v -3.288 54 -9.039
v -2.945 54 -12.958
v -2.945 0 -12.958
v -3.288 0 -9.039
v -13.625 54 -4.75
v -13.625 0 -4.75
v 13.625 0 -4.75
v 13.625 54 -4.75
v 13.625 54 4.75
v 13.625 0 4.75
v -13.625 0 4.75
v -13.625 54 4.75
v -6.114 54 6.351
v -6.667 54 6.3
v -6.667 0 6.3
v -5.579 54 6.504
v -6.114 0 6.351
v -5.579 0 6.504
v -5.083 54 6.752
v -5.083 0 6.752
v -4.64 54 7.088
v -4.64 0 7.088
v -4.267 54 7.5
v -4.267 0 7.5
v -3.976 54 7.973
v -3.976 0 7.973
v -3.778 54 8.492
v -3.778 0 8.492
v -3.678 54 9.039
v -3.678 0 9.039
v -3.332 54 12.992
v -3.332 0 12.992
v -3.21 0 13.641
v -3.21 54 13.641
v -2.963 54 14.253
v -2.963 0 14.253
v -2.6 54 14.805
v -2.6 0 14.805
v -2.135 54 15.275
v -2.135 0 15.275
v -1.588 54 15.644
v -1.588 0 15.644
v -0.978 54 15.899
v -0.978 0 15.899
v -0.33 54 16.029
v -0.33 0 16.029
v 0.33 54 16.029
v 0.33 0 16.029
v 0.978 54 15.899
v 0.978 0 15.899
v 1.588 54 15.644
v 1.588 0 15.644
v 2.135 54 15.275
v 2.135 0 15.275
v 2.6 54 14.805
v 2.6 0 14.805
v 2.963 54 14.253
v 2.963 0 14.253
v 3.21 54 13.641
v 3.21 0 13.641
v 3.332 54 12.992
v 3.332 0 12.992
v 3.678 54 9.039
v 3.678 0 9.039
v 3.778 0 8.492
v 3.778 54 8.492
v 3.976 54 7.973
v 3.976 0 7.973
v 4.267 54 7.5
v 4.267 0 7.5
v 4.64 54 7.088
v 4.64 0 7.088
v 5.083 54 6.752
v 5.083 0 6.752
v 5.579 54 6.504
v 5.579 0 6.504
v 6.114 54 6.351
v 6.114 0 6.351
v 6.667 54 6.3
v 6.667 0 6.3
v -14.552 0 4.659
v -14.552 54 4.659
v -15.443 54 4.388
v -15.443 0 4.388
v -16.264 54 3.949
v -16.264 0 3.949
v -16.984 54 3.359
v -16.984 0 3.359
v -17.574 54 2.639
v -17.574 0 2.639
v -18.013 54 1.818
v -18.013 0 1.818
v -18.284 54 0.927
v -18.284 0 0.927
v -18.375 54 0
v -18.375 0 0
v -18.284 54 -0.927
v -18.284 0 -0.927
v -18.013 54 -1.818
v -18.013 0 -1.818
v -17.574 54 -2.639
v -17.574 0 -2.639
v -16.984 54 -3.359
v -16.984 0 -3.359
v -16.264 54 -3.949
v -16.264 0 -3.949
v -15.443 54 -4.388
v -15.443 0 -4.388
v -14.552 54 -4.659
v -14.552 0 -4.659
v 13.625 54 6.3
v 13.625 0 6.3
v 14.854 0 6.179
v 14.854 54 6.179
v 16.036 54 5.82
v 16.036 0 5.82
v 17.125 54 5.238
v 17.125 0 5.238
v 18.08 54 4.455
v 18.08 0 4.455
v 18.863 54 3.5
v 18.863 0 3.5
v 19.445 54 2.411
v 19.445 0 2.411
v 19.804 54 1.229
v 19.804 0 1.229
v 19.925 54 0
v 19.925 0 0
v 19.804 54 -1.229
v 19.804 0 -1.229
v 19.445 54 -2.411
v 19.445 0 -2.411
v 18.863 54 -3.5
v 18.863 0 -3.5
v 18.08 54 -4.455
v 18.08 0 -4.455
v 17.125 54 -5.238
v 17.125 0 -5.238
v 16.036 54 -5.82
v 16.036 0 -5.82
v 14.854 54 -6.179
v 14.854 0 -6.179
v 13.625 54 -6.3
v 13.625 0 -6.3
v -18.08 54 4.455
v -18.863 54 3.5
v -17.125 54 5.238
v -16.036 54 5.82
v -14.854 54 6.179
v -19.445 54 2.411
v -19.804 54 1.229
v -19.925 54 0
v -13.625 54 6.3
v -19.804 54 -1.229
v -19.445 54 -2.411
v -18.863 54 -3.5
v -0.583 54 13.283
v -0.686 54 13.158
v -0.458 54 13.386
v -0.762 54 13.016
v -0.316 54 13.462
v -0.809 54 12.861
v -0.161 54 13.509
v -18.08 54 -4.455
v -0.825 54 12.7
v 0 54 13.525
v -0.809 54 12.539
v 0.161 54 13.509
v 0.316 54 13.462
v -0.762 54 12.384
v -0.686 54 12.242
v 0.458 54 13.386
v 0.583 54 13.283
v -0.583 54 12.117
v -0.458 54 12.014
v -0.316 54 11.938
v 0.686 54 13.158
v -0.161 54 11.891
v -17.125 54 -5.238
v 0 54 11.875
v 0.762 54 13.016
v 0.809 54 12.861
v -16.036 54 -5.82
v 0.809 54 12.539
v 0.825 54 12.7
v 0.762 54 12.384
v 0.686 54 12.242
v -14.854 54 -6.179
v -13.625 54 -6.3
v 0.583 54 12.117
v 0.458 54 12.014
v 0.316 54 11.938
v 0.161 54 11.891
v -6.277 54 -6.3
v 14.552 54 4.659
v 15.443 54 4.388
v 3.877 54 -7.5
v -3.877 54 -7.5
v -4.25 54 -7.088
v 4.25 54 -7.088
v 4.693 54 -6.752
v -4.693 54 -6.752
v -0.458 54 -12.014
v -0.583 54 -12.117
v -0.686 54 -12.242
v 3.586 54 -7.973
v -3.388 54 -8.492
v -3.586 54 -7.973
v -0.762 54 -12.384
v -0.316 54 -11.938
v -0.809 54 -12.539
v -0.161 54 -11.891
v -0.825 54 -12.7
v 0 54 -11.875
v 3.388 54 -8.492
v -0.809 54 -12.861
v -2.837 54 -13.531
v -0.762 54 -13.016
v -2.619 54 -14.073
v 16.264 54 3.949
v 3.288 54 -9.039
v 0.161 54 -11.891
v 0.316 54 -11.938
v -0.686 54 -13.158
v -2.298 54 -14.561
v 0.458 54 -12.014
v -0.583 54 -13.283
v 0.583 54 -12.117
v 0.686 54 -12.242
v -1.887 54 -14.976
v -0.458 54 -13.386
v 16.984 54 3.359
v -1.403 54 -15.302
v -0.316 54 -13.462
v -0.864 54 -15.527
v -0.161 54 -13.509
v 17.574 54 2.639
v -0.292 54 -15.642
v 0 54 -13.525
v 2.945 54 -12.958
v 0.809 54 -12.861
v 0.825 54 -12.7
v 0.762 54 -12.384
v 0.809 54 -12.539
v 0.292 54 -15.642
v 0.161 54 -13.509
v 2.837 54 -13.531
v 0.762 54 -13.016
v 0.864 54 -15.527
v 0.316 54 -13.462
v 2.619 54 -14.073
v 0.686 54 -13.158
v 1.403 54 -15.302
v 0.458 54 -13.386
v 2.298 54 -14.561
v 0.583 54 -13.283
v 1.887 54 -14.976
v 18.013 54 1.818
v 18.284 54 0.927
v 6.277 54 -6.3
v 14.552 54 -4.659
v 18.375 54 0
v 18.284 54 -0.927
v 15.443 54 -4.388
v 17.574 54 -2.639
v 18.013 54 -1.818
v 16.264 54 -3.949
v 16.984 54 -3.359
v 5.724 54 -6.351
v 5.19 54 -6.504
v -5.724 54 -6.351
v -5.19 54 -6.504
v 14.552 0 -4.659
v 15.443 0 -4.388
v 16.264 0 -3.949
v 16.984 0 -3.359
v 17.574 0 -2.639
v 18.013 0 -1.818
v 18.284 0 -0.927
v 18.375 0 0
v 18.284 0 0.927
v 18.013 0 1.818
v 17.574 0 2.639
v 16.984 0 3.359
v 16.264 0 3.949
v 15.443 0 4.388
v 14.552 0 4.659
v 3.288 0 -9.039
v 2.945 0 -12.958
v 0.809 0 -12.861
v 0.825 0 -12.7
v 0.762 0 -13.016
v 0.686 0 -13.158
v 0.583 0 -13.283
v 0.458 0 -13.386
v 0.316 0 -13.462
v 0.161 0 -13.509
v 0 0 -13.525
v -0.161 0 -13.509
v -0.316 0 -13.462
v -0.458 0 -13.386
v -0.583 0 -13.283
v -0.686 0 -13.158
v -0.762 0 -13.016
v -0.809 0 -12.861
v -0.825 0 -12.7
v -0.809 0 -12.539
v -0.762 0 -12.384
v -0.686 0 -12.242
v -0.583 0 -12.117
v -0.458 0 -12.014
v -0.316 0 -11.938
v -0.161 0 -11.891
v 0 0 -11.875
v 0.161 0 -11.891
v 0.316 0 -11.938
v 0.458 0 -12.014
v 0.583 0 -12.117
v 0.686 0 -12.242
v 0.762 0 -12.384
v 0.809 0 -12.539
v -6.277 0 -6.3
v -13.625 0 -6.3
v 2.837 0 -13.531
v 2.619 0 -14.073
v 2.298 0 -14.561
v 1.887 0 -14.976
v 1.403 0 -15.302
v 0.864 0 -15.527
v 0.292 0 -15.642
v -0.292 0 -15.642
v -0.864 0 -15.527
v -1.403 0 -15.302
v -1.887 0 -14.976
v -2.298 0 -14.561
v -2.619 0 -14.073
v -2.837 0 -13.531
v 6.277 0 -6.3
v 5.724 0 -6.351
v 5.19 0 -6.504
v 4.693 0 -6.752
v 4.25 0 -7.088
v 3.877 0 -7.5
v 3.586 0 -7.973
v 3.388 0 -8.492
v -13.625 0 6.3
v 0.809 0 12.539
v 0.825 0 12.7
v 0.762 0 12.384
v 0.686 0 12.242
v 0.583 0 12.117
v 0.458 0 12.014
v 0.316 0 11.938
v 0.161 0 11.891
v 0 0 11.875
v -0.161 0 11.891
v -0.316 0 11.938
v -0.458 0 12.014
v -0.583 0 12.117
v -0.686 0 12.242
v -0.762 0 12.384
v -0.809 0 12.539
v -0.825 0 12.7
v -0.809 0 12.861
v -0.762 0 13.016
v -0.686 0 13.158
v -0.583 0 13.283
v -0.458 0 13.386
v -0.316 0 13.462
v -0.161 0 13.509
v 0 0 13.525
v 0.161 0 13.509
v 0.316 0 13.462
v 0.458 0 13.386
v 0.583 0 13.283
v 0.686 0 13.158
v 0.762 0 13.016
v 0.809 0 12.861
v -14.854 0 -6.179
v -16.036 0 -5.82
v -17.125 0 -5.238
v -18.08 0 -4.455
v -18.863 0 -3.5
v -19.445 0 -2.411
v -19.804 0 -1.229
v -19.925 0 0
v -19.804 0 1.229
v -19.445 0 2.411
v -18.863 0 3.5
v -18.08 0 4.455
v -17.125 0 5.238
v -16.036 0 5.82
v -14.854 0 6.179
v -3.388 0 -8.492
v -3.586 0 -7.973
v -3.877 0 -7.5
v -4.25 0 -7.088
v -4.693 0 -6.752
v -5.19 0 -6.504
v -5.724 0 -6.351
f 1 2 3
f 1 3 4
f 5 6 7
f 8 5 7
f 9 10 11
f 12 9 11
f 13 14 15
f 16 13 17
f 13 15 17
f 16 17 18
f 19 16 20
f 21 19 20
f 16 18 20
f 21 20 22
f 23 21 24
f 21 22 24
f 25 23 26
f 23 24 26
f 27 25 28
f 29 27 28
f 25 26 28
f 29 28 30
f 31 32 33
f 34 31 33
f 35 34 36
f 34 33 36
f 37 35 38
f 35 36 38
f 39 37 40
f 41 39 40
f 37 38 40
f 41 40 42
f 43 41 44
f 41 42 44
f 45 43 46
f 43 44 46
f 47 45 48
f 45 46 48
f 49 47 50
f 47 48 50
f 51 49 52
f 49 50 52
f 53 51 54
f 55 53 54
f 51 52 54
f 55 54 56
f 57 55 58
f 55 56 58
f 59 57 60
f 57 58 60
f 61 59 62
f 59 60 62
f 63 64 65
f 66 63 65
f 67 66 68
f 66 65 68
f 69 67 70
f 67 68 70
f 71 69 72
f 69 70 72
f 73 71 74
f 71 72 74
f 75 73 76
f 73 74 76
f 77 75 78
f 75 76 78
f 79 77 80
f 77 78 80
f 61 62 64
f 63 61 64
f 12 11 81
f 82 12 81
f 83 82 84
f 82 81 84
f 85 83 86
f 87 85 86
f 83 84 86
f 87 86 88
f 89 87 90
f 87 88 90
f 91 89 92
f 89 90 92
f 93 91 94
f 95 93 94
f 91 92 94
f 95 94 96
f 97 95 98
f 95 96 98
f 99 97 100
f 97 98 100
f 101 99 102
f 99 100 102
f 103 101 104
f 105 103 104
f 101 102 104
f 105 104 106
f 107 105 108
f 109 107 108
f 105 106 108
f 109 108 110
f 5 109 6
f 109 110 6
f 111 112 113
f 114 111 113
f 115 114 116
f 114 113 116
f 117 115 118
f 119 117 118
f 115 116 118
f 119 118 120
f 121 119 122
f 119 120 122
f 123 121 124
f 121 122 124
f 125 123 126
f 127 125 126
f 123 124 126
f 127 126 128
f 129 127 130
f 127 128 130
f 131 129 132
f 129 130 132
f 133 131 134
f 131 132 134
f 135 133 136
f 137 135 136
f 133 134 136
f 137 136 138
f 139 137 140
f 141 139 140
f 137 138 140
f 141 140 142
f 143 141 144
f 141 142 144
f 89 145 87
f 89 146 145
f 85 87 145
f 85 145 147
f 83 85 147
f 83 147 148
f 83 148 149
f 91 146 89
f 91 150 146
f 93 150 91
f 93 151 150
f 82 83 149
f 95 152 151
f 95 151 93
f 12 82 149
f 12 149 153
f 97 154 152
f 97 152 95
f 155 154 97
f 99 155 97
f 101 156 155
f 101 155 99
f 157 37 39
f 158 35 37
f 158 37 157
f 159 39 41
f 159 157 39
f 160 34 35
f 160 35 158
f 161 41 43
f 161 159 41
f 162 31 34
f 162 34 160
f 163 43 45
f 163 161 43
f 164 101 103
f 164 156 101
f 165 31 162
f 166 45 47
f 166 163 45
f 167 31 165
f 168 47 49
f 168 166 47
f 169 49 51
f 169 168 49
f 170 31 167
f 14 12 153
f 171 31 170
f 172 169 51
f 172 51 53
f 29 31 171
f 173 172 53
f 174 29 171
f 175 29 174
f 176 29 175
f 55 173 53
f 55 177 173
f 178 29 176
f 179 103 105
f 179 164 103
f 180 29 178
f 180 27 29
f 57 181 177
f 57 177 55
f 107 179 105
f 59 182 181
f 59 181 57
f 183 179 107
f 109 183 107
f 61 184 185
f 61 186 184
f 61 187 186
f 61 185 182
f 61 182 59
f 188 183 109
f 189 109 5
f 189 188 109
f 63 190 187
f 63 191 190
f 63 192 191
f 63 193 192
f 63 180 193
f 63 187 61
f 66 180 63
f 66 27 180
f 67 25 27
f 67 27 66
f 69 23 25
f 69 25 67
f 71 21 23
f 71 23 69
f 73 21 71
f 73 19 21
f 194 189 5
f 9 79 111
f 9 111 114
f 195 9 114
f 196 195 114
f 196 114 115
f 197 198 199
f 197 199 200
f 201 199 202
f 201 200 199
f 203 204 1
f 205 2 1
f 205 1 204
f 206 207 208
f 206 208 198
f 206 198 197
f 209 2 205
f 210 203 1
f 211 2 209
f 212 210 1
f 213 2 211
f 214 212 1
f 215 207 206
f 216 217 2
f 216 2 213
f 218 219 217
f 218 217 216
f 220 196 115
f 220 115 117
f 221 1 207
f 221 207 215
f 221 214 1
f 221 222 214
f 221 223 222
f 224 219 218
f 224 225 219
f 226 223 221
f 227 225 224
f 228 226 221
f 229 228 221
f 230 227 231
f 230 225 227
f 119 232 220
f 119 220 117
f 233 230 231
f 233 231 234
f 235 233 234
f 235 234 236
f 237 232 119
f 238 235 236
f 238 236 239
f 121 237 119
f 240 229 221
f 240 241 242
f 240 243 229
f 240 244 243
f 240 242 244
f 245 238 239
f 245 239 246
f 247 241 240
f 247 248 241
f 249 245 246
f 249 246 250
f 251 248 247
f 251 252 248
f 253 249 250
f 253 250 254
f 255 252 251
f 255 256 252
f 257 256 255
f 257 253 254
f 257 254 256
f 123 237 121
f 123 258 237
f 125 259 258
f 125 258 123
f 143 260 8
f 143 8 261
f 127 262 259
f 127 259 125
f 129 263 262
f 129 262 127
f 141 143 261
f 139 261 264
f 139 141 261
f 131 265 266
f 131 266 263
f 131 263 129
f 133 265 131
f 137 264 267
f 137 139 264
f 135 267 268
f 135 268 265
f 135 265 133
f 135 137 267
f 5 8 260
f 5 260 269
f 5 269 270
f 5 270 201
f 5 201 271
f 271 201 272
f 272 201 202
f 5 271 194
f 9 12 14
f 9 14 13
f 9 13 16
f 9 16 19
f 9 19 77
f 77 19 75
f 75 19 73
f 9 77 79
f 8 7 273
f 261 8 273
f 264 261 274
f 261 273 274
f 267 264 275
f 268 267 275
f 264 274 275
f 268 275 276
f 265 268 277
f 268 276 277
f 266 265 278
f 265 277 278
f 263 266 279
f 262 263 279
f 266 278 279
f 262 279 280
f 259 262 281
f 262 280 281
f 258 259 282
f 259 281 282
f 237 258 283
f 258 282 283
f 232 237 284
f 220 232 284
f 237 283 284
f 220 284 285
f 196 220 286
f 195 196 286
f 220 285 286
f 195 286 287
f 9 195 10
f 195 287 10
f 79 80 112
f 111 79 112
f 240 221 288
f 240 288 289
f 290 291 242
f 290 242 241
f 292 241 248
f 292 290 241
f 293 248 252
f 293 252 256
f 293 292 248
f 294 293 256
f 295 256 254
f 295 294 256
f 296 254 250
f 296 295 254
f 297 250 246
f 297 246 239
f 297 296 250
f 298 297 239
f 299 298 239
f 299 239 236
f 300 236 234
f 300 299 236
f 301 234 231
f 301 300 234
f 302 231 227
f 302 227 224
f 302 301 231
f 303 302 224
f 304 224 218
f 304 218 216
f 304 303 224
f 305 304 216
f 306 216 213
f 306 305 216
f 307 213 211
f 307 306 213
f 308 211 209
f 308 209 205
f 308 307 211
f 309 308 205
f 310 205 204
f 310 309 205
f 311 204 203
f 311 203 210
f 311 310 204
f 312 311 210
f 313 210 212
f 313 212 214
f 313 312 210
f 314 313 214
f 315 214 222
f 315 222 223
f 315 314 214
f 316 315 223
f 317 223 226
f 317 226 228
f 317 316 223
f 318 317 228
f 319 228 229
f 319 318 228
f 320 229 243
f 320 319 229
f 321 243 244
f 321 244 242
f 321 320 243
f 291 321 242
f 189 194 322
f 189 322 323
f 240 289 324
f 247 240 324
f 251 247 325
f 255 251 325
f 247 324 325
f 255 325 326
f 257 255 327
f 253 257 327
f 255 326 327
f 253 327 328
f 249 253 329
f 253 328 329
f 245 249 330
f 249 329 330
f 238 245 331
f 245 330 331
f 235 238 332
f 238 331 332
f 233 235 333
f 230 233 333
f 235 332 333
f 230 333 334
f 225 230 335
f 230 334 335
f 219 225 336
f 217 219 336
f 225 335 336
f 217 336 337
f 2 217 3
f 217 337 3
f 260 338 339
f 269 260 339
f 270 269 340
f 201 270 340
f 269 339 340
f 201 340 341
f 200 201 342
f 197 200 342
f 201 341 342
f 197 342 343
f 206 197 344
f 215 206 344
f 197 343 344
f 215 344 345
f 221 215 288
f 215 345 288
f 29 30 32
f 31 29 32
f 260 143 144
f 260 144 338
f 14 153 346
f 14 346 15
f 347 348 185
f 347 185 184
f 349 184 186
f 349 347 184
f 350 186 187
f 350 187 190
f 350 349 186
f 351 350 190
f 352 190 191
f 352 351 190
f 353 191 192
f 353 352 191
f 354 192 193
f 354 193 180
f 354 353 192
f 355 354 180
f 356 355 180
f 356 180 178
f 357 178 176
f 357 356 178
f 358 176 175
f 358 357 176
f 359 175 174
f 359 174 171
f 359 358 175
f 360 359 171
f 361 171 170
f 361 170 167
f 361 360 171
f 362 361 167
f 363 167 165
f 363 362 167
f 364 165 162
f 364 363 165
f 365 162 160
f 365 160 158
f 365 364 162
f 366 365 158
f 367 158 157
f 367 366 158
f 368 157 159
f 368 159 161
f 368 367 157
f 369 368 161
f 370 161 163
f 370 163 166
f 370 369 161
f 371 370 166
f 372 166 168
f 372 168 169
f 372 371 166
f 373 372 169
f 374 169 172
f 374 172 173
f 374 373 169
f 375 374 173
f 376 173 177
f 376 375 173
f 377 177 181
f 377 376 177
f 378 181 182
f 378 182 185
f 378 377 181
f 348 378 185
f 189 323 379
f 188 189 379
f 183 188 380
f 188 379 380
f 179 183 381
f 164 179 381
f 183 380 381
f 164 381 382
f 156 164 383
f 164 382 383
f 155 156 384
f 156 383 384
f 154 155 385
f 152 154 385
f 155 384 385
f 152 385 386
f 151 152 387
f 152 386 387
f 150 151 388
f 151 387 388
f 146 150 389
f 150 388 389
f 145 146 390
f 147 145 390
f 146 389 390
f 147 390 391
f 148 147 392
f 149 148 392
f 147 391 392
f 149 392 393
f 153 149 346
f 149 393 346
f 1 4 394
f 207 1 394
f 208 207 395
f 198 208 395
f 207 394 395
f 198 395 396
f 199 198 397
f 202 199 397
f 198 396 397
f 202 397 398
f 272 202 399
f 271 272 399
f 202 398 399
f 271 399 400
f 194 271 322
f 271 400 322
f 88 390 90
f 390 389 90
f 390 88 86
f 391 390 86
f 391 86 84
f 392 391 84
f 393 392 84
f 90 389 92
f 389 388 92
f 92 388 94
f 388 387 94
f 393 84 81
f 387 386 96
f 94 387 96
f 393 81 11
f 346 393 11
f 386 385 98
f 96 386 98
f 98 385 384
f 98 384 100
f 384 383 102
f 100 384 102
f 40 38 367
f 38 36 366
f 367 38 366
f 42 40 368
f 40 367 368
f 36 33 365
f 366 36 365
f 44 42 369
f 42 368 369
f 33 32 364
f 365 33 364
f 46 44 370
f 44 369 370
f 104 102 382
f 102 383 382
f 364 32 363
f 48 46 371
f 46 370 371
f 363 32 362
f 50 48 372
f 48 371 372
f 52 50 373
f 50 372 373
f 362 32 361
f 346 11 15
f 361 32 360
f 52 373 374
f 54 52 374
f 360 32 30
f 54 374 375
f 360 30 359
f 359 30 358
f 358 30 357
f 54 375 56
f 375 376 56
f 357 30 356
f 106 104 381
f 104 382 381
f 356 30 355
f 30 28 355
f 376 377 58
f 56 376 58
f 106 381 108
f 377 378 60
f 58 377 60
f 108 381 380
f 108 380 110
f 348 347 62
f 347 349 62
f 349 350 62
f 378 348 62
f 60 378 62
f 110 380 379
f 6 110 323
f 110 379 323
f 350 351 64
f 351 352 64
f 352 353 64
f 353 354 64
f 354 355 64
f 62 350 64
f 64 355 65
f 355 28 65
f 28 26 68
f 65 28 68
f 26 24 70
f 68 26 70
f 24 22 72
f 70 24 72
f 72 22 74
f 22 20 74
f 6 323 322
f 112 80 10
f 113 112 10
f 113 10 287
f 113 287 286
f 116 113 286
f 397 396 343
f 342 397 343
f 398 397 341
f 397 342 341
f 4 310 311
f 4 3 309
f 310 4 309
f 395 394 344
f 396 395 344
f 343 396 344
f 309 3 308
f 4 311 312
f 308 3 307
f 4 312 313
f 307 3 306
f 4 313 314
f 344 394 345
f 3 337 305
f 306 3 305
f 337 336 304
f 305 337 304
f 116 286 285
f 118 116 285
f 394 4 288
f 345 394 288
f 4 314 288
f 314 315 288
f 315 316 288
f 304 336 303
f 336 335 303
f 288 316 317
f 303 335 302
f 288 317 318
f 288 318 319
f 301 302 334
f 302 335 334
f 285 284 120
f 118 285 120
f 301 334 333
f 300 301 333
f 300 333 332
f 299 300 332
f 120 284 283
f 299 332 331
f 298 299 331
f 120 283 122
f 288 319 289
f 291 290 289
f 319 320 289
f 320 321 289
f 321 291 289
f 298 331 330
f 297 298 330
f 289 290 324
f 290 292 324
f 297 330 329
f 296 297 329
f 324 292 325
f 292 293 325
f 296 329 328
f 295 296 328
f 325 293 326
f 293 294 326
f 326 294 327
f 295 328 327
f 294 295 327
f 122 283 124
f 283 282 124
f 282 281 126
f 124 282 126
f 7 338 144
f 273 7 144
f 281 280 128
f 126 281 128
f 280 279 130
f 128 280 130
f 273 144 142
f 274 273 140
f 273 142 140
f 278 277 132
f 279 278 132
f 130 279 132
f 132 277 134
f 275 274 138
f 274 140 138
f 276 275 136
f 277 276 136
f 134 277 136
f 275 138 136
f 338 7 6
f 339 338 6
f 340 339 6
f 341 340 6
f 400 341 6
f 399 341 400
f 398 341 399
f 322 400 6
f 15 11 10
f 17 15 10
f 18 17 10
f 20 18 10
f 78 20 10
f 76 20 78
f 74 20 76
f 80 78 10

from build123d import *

# Parameters (mm, degrees)
SKETCH1_R      = 0.825
EXTRUDE1_DEPTH = 54


with BuildPart() as part:
    # Sketch1 → Extrude1 (new body)
    with BuildSketch(Plane(origin=(0, 0, 0), x_dir=(1, 0, 0), z_dir=(0, 1, 0))):
        with BuildLine():
            Line((-2.945413127, 12.957690258), (-3.288294978, 9.038532772))
            ThreePointArc((-3.288294978, 9.038532772), (-4.250108449, 7.08816799), (-6.276879072, 6.3))
            Line((-6.276879072, 6.3), (-13.625, 6.3))
            ThreePointArc((-13.625, 6.3), (-19.925, 0), (-13.625, -6.3))
            Line((-13.625, -6.3), (-6.666750968, -6.3))
            ThreePointArc((-6.666750968, -6.3), (-4.639980345, -7.08816799), (-3.678166874, -9.038532772))
            Line((-3.678166874, -9.038532772), (-3.332323508, -12.99154053))
            ThreePointArc((-3.332323508, -12.99154053), (0, -16.045052443), (3.332323508, -12.99154053))
            Line((3.332323508, -12.99154053), (3.678166874, -9.038532772))
            ThreePointArc((3.678166874, -9.038532772), (4.639980345, -7.08816799), (6.666750968, -6.3))
            Line((6.666750968, -6.3), (13.625, -6.3))
            ThreePointArc((13.625, -6.3), (19.925, 0), (13.625, 6.3))
            Line((13.625, 6.3), (6.276879072, 6.3))
            ThreePointArc((6.276879072, 6.3), (4.250108449, 7.08816799), (3.288294978, 9.038532772))
            Line((3.288294978, 9.038532772), (2.945413127, 12.957690258))
            ThreePointArc((2.945413127, 12.957690258), (0, 15.656664127), (-2.945413127, 12.957690258))
        make_face()
        with Locations((0, 12.7)):
            Circle(SKETCH1_R, mode=Mode.SUBTRACT)
        with Locations((0, -12.7)):
            Circle(SKETCH1_R, mode=Mode.SUBTRACT)
        with BuildLine():
            Line((-13.625, 4.75), (13.625, 4.75))
            ThreePointArc((13.625, 4.75), (18.375, 0), (13.625, -4.75))
            Line((13.625, -4.75), (-13.625, -4.75))
            ThreePointArc((-13.625, -4.75), (-18.375, 0), (-13.625, 4.75))
        make_face(mode=Mode.SUBTRACT)
    extrude(amount=EXTRUDE1_DEPTH)


solid = part.part
